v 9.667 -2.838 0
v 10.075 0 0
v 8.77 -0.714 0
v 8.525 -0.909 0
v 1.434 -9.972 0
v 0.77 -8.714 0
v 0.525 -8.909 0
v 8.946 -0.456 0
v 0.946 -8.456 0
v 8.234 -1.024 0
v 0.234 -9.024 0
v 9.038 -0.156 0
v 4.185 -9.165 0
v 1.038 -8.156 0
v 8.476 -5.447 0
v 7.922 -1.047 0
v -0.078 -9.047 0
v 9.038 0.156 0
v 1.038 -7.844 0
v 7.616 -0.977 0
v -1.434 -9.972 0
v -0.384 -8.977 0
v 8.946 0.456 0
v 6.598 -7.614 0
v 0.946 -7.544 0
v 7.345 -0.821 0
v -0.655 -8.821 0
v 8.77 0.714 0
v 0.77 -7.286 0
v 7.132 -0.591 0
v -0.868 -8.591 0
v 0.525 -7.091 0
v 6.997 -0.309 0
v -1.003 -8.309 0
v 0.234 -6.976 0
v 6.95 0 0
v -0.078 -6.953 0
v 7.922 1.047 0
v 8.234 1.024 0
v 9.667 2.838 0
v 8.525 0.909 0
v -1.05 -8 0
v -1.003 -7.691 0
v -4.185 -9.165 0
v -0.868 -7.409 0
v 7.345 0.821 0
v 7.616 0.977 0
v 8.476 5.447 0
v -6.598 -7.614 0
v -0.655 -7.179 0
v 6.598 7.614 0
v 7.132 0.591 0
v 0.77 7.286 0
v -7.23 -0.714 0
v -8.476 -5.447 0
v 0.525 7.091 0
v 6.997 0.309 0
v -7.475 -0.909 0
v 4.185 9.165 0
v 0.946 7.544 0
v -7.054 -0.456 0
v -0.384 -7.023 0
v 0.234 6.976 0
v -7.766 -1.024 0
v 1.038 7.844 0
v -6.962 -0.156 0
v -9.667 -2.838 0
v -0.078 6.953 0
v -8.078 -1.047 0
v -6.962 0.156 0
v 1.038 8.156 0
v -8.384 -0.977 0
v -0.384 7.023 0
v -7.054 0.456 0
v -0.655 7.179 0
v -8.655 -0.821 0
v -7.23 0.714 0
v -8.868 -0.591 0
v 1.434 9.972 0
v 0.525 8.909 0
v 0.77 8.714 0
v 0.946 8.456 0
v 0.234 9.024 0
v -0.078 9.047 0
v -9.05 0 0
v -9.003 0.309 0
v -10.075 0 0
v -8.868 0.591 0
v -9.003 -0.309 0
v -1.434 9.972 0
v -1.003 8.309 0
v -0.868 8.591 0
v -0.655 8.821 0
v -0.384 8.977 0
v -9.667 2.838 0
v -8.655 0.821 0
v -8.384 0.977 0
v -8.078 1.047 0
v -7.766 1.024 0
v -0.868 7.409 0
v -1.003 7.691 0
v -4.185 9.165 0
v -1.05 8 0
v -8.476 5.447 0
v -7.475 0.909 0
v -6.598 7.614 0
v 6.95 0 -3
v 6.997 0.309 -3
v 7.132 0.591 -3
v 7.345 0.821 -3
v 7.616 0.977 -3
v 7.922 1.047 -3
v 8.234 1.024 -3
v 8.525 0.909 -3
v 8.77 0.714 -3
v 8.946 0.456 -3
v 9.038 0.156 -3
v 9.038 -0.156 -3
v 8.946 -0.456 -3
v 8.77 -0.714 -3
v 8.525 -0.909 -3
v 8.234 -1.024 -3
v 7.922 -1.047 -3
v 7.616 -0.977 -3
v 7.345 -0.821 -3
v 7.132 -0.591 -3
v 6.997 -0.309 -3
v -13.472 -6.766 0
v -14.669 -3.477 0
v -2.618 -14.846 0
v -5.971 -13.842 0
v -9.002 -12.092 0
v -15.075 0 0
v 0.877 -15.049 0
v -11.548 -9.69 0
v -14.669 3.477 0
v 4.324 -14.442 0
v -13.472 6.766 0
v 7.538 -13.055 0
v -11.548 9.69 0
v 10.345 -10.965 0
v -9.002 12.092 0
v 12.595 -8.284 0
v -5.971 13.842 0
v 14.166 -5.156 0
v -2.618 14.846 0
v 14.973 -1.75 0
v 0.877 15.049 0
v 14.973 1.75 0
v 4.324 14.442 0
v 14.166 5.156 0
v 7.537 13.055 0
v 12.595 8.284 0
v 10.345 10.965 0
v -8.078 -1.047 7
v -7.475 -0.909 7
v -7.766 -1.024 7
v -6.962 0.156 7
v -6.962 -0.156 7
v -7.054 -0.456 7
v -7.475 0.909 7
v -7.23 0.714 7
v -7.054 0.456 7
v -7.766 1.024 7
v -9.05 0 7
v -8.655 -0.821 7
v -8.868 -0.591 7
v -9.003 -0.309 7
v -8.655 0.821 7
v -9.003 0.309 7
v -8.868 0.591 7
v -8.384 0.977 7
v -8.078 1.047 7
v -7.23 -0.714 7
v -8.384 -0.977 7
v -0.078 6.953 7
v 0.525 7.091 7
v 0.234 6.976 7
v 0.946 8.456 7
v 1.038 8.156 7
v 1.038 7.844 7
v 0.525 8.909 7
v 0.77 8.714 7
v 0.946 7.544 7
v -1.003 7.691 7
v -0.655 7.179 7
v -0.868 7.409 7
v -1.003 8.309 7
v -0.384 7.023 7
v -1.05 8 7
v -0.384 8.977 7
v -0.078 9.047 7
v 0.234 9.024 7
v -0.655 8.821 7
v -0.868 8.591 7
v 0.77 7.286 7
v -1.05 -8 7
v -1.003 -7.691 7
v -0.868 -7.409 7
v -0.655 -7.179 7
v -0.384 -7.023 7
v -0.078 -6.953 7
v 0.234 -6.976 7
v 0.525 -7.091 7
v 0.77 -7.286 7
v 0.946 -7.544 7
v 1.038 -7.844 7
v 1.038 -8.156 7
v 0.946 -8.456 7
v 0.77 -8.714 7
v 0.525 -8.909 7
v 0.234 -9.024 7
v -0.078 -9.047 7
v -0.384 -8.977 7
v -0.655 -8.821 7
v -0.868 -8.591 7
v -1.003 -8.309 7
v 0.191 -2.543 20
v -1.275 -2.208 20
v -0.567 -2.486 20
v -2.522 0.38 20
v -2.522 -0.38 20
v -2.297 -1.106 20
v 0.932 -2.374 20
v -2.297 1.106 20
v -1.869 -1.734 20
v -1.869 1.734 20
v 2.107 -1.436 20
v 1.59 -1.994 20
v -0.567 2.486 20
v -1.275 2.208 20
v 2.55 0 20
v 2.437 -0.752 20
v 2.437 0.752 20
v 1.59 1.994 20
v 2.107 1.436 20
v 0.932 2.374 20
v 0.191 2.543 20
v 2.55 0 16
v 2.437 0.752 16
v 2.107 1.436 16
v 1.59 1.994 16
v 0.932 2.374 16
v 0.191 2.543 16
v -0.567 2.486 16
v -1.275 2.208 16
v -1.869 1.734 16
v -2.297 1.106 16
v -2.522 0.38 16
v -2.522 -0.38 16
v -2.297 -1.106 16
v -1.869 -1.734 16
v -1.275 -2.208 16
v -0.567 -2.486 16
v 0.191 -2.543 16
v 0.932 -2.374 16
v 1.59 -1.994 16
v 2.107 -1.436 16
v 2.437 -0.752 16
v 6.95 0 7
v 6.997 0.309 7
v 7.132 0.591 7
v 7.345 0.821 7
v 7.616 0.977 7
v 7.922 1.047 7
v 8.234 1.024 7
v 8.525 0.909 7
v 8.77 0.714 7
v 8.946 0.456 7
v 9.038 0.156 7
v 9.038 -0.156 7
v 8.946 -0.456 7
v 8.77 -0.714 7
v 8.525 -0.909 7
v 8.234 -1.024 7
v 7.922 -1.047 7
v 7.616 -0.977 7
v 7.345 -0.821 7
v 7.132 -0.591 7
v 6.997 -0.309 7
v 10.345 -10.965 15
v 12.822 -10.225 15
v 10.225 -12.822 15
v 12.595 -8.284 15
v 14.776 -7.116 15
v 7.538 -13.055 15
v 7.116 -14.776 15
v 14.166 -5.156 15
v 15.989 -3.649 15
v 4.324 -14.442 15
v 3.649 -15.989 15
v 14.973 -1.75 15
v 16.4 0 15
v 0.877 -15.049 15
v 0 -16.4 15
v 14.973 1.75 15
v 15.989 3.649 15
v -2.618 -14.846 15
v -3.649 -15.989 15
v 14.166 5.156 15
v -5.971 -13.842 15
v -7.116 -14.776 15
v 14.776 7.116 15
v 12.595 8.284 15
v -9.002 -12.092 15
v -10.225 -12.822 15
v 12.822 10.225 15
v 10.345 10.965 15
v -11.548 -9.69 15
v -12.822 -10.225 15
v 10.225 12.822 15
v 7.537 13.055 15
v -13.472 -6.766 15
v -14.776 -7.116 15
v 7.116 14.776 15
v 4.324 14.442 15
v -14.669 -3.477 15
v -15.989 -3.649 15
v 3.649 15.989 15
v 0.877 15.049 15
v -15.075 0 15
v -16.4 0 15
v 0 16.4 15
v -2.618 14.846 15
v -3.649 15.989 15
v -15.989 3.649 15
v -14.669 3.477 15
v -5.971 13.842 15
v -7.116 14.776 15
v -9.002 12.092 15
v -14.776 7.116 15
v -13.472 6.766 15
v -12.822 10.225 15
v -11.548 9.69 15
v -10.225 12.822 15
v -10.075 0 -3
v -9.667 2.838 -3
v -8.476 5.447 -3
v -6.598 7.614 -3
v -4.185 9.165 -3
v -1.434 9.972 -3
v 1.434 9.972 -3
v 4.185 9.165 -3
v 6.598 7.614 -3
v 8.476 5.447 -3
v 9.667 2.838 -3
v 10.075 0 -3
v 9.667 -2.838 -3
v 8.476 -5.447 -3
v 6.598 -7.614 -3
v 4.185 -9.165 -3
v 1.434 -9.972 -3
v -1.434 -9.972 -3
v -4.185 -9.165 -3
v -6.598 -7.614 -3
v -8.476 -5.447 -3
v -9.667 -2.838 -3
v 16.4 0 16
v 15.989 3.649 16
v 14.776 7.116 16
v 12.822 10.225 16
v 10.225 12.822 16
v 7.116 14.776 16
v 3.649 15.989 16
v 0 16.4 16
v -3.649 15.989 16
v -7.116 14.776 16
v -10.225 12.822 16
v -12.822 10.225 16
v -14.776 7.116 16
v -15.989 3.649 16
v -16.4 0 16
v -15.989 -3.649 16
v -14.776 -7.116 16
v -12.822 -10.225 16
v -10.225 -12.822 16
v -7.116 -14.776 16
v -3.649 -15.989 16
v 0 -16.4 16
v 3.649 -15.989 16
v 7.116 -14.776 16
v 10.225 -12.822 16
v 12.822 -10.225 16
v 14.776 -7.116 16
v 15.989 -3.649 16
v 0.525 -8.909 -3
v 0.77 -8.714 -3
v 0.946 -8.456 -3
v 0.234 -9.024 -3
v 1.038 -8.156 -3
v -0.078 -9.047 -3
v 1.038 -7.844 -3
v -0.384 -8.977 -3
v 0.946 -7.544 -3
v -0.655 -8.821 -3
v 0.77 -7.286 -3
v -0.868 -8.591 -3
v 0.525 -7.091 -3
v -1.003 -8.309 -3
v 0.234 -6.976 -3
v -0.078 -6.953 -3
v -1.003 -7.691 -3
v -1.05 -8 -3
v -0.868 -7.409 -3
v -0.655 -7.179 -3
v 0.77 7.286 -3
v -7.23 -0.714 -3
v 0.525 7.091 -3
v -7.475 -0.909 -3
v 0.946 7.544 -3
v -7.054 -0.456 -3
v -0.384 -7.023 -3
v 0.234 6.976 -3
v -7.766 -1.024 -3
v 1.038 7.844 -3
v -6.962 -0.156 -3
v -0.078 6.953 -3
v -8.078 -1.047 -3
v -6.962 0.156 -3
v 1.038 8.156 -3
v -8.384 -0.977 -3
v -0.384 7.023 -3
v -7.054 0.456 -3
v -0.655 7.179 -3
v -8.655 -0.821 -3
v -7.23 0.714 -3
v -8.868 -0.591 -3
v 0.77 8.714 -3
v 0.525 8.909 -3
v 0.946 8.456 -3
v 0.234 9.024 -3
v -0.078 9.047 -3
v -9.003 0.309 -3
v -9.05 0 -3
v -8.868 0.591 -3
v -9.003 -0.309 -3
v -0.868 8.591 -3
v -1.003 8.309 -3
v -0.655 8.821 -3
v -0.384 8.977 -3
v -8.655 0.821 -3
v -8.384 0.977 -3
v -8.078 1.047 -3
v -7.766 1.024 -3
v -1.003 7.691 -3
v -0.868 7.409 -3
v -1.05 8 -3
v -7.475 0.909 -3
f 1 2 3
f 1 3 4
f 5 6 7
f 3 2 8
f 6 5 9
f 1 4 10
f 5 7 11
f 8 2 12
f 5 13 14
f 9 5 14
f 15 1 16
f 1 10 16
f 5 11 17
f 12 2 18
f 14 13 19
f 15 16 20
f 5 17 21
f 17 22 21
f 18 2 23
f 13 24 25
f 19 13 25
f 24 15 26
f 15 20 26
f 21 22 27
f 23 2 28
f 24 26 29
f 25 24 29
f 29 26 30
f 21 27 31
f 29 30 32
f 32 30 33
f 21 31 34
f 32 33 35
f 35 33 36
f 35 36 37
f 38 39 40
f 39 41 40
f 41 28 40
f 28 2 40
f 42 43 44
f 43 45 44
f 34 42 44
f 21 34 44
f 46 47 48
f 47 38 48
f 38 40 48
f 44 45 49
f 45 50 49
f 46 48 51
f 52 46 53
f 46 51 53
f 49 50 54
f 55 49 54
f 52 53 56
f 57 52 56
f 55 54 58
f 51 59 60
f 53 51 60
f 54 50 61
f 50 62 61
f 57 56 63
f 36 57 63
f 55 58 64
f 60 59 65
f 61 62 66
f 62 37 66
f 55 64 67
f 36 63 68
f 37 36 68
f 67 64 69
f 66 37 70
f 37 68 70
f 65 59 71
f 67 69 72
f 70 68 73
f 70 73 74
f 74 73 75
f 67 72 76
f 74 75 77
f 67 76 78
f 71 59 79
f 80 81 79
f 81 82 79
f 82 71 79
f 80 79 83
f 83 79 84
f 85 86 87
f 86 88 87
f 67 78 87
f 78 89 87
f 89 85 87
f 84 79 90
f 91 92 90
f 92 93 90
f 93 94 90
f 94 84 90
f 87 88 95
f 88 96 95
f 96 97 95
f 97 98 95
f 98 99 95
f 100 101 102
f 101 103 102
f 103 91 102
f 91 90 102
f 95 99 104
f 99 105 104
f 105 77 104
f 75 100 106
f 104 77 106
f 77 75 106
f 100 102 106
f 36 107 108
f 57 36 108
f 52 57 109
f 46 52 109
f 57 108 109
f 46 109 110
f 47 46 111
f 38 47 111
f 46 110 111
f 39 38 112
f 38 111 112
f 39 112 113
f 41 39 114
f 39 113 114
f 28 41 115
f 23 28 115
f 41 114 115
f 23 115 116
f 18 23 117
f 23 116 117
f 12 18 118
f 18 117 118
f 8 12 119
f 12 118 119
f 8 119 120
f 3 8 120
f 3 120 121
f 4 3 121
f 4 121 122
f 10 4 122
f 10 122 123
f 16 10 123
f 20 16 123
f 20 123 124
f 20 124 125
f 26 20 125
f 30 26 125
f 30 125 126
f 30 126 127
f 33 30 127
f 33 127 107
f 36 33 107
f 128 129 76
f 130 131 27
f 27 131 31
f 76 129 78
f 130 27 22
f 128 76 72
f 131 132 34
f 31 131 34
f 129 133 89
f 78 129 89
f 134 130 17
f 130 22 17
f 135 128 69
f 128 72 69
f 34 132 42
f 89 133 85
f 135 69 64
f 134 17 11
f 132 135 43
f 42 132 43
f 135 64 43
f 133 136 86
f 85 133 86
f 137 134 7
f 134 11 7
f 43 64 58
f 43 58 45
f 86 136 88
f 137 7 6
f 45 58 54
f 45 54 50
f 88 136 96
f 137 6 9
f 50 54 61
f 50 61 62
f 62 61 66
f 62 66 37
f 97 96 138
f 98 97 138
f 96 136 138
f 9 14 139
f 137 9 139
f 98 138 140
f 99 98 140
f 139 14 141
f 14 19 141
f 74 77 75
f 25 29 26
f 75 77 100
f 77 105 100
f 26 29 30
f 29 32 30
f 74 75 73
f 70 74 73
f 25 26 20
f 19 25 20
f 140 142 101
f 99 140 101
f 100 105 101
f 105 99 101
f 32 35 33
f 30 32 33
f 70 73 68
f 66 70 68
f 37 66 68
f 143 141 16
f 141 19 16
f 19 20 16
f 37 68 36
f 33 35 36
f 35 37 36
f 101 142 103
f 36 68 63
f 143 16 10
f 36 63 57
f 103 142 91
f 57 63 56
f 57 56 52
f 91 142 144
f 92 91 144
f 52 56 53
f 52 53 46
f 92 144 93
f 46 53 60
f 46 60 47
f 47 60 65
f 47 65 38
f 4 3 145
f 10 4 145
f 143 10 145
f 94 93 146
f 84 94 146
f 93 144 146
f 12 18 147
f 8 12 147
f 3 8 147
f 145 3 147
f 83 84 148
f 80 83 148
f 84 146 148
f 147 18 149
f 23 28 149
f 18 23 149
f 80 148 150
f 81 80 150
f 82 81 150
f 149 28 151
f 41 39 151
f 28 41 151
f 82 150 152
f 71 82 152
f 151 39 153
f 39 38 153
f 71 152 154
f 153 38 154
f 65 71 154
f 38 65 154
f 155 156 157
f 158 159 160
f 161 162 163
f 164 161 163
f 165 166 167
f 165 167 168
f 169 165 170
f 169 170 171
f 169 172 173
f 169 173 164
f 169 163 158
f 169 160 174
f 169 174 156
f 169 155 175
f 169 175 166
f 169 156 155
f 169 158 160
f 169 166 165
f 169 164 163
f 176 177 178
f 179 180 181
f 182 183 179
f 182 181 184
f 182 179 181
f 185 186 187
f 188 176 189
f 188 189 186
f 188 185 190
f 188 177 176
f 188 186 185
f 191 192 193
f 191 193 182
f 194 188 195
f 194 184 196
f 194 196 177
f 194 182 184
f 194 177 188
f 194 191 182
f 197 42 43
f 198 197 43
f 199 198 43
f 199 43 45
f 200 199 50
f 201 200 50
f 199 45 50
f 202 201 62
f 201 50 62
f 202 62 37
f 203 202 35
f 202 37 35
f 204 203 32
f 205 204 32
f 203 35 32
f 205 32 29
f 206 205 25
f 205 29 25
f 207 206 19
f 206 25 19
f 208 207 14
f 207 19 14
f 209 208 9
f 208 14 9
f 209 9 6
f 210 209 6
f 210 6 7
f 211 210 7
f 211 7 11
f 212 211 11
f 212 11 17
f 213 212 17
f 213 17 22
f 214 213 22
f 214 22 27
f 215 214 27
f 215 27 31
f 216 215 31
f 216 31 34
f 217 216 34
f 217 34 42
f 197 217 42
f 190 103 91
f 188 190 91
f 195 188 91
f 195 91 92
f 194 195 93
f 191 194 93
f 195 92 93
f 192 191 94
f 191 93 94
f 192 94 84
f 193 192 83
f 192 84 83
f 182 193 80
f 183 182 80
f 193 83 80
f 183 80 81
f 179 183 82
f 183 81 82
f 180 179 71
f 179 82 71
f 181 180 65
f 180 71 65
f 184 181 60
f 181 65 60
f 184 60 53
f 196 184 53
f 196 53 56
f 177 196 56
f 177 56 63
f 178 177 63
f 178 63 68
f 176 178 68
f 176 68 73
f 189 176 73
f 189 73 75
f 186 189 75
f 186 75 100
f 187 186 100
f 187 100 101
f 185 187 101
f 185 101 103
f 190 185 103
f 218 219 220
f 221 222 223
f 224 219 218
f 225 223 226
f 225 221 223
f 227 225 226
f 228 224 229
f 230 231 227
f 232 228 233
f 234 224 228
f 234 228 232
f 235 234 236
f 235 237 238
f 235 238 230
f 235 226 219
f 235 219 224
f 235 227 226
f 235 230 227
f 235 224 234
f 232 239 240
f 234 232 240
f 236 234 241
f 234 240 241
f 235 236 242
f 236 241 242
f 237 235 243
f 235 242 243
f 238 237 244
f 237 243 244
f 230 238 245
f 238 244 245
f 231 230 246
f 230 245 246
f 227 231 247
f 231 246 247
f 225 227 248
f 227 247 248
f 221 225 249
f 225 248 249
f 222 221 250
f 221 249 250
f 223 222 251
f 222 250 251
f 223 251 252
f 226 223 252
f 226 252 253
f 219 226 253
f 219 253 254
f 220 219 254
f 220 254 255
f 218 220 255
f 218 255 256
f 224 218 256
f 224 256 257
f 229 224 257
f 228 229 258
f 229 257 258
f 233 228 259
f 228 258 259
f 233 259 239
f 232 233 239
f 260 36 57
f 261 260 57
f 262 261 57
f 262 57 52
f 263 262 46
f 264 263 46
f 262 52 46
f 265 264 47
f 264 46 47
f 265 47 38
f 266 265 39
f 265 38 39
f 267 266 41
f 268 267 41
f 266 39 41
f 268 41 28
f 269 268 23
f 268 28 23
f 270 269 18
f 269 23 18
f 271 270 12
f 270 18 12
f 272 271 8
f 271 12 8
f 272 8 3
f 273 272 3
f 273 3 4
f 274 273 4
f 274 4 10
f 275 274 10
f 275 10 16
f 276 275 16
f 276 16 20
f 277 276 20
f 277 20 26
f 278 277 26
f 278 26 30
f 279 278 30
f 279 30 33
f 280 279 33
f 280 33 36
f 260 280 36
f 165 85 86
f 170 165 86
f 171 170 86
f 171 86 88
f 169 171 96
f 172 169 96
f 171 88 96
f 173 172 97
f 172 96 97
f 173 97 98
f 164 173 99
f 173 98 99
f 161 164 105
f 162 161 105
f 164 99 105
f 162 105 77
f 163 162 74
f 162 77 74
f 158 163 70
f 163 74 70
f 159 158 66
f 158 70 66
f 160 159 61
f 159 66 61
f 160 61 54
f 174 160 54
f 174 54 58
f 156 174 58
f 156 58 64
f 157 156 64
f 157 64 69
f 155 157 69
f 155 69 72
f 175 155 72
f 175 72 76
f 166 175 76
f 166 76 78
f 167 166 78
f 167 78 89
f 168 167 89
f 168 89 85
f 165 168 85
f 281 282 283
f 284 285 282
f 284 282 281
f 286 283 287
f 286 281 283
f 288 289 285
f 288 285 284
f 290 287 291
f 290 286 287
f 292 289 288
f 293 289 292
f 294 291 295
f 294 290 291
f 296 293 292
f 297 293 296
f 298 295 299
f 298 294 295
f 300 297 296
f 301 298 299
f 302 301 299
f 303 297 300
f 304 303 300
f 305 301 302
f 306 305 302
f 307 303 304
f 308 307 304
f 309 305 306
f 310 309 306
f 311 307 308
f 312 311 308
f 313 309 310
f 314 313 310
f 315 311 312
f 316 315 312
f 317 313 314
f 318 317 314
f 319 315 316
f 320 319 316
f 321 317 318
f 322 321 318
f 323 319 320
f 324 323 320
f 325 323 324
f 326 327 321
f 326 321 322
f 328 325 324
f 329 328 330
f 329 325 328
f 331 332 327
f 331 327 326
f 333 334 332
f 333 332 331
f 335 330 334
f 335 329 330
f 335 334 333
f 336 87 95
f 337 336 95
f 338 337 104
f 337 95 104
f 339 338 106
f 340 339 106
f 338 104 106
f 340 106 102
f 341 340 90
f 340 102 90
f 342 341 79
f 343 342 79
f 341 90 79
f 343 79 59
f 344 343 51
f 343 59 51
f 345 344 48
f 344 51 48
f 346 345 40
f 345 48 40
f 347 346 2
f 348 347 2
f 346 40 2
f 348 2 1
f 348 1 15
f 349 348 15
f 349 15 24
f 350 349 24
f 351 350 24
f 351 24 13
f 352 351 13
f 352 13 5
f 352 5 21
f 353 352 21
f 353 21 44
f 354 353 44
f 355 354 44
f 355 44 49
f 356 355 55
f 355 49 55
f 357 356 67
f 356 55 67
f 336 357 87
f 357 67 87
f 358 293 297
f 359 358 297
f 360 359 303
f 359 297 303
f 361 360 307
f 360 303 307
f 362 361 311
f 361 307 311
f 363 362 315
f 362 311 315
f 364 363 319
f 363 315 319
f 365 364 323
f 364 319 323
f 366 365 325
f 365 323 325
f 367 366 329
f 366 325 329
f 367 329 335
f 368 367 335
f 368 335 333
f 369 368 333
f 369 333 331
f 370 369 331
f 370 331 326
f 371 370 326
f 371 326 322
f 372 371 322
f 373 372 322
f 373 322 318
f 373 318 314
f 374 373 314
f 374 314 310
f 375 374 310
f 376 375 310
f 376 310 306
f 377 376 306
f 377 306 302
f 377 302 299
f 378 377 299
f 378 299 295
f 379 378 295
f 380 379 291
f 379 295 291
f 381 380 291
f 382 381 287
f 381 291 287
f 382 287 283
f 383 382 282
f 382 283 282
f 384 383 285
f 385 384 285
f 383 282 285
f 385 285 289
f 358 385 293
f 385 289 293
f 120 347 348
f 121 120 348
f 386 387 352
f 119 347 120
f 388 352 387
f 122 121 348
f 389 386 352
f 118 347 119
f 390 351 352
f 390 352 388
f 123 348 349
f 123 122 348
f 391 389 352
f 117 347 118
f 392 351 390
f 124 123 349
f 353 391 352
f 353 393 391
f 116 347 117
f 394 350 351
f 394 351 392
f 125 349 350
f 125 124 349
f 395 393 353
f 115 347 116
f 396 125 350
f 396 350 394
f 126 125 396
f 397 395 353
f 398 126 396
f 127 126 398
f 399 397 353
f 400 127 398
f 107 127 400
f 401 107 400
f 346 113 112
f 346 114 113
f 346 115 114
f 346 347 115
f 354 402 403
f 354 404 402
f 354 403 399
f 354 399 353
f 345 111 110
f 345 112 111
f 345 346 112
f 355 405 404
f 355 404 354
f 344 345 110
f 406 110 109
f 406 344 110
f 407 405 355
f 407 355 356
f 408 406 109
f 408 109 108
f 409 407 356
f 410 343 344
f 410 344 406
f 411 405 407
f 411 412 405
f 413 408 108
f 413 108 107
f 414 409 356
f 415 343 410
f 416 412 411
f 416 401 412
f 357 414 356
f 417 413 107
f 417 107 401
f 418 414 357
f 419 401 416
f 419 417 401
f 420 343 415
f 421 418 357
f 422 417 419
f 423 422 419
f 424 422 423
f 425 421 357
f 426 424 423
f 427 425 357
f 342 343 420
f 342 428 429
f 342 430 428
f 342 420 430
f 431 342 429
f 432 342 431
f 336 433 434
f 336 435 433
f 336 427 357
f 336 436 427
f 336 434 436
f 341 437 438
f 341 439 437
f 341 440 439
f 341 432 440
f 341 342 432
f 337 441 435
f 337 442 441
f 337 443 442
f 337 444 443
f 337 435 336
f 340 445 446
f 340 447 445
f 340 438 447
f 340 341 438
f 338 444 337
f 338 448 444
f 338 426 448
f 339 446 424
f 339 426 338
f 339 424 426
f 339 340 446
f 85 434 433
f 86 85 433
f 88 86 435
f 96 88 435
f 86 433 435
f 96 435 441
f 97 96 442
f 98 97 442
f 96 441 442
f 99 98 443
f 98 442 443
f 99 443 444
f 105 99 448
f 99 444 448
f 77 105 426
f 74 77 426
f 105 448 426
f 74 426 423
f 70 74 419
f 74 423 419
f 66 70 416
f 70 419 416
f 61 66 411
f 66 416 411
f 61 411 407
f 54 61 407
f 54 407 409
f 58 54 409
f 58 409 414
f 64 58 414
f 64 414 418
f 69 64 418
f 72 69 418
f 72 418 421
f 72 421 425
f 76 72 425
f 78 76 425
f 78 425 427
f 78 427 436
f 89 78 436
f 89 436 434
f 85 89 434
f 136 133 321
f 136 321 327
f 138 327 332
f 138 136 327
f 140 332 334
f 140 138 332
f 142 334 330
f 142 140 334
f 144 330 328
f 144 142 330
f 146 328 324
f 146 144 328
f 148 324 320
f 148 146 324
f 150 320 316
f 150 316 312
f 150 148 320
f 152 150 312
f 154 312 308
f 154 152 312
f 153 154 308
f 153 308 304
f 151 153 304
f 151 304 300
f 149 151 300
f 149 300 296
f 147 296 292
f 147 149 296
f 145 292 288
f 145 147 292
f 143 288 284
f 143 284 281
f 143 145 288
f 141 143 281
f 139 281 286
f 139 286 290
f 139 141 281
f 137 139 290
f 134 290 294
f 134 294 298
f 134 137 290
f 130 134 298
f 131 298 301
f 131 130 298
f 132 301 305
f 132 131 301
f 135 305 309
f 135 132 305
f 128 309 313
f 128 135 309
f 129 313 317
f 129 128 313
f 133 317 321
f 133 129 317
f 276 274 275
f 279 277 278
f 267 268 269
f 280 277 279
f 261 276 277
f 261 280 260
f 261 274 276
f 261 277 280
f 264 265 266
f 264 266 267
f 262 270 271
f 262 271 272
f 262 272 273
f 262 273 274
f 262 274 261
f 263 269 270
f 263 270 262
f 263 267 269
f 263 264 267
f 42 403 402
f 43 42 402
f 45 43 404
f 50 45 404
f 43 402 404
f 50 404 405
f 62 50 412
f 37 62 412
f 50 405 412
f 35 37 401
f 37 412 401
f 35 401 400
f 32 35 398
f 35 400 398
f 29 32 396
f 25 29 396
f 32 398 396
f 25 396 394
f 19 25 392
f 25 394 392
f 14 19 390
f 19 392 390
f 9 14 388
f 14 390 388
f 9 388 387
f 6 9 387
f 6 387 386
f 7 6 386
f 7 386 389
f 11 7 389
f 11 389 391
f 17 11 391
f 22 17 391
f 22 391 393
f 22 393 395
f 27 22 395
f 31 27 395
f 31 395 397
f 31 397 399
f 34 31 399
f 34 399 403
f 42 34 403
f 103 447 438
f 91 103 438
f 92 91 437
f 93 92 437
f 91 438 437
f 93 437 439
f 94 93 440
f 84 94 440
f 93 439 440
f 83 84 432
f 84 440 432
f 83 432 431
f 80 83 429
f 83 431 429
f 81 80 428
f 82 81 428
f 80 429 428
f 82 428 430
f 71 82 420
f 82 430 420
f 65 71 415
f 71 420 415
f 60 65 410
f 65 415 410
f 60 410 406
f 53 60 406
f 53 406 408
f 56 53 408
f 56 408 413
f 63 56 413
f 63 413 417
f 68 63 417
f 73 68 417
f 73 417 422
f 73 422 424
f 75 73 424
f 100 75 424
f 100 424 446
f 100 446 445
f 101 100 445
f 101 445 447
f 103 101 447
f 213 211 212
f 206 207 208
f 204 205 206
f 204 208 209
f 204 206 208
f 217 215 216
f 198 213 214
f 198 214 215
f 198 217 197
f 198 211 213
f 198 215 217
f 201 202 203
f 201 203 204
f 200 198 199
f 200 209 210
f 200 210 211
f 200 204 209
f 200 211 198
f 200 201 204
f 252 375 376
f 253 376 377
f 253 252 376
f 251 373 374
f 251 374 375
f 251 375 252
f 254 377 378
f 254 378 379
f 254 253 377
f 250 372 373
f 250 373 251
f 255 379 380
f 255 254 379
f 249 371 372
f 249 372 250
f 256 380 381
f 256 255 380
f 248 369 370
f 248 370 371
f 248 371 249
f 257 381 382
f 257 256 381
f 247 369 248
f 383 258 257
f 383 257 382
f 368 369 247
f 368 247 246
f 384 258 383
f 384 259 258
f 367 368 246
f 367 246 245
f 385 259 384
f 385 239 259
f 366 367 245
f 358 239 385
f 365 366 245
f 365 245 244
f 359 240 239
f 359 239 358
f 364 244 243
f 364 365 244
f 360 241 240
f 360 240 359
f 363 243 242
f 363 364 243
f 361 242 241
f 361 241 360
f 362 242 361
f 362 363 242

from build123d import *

# Parameters (mm, degrees)
SKETCH_1_R          = 16.4
EXTRUDE_1_DEPTH     = 16
SKETCH_2_R          = 2.55
EXTRUDE_2_DEPTH     = 4
SKETCH_3_R          = 10.075
EXTRUDE_3_DEPTH     = 3
SKETCH_5_R          = 16.4
SKETCH_5_R_2        = 15.075
CUT_EXTRUDE_2_DEPTH = 15
SKETCH_7_R          = 1.05
CUT_EXTRUDE_3_DEPTH = 10


with BuildPart() as part:
    # 草图1 → 凸台-拉伸1 (new body)
    with BuildSketch(Plane.XY):
        Circle(SKETCH_1_R)
    extrude(amount=EXTRUDE_1_DEPTH)

    # 草图2 → 凸台-拉伸2 (add)
    with BuildSketch(Plane.XY.offset(16)):
        Circle(SKETCH_2_R)
    extrude(amount=EXTRUDE_2_DEPTH)

    # 草图5 → 切除-拉伸2 (cut)
    with BuildSketch(Plane(origin=(0, 0, 0), x_dir=(-1, 0, 0), z_dir=(0, 0, -1))):
        Circle(SKETCH_5_R)
        Circle(SKETCH_5_R_2, mode=Mode.SUBTRACT)
    extrude(amount=-CUT_EXTRUDE_2_DEPTH, mode=Mode.SUBTRACT)


with BuildPart() as body_2:
    # 草图3 → 凸台-拉伸3 (new body)
    with BuildSketch(Plane(origin=(0, 0, 0), x_dir=(-1, 0, 0), z_dir=(0, 0, -1))):
        Circle(SKETCH_3_R)
    extrude(amount=EXTRUDE_3_DEPTH)


with BuildPart() as cut_extrude_3_tool:
    # 草图7 → 切除-拉伸3 (new body)
    with BuildSketch(Plane(origin=(0, 0, -3), x_dir=(-1, 0, 0), z_dir=(0, 0, -1))):
        with Locations((0, 8)):
            Circle(SKETCH_7_R)
        with Locations((8, 0)):
            Circle(SKETCH_7_R)
        with Locations((0, -8)):
            Circle(SKETCH_7_R)
        with Locations((-8, 0)):
            Circle(SKETCH_7_R)
    extrude(amount=-CUT_EXTRUDE_3_DEPTH)


with BuildPart() as part_1:
    add(part.part)

    # 切除-拉伸3: cut by cut_extrude_3_tool
    add(cut_extrude_3_tool.part, mode=Mode.SUBTRACT)


with BuildPart() as body_2_1:
    add(body_2.part)

    # 切除-拉伸3: cut by cut_extrude_3_tool
    add(cut_extrude_3_tool.part, mode=Mode.SUBTRACT)


solid = Compound([part_1.part, body_2_1.part])
